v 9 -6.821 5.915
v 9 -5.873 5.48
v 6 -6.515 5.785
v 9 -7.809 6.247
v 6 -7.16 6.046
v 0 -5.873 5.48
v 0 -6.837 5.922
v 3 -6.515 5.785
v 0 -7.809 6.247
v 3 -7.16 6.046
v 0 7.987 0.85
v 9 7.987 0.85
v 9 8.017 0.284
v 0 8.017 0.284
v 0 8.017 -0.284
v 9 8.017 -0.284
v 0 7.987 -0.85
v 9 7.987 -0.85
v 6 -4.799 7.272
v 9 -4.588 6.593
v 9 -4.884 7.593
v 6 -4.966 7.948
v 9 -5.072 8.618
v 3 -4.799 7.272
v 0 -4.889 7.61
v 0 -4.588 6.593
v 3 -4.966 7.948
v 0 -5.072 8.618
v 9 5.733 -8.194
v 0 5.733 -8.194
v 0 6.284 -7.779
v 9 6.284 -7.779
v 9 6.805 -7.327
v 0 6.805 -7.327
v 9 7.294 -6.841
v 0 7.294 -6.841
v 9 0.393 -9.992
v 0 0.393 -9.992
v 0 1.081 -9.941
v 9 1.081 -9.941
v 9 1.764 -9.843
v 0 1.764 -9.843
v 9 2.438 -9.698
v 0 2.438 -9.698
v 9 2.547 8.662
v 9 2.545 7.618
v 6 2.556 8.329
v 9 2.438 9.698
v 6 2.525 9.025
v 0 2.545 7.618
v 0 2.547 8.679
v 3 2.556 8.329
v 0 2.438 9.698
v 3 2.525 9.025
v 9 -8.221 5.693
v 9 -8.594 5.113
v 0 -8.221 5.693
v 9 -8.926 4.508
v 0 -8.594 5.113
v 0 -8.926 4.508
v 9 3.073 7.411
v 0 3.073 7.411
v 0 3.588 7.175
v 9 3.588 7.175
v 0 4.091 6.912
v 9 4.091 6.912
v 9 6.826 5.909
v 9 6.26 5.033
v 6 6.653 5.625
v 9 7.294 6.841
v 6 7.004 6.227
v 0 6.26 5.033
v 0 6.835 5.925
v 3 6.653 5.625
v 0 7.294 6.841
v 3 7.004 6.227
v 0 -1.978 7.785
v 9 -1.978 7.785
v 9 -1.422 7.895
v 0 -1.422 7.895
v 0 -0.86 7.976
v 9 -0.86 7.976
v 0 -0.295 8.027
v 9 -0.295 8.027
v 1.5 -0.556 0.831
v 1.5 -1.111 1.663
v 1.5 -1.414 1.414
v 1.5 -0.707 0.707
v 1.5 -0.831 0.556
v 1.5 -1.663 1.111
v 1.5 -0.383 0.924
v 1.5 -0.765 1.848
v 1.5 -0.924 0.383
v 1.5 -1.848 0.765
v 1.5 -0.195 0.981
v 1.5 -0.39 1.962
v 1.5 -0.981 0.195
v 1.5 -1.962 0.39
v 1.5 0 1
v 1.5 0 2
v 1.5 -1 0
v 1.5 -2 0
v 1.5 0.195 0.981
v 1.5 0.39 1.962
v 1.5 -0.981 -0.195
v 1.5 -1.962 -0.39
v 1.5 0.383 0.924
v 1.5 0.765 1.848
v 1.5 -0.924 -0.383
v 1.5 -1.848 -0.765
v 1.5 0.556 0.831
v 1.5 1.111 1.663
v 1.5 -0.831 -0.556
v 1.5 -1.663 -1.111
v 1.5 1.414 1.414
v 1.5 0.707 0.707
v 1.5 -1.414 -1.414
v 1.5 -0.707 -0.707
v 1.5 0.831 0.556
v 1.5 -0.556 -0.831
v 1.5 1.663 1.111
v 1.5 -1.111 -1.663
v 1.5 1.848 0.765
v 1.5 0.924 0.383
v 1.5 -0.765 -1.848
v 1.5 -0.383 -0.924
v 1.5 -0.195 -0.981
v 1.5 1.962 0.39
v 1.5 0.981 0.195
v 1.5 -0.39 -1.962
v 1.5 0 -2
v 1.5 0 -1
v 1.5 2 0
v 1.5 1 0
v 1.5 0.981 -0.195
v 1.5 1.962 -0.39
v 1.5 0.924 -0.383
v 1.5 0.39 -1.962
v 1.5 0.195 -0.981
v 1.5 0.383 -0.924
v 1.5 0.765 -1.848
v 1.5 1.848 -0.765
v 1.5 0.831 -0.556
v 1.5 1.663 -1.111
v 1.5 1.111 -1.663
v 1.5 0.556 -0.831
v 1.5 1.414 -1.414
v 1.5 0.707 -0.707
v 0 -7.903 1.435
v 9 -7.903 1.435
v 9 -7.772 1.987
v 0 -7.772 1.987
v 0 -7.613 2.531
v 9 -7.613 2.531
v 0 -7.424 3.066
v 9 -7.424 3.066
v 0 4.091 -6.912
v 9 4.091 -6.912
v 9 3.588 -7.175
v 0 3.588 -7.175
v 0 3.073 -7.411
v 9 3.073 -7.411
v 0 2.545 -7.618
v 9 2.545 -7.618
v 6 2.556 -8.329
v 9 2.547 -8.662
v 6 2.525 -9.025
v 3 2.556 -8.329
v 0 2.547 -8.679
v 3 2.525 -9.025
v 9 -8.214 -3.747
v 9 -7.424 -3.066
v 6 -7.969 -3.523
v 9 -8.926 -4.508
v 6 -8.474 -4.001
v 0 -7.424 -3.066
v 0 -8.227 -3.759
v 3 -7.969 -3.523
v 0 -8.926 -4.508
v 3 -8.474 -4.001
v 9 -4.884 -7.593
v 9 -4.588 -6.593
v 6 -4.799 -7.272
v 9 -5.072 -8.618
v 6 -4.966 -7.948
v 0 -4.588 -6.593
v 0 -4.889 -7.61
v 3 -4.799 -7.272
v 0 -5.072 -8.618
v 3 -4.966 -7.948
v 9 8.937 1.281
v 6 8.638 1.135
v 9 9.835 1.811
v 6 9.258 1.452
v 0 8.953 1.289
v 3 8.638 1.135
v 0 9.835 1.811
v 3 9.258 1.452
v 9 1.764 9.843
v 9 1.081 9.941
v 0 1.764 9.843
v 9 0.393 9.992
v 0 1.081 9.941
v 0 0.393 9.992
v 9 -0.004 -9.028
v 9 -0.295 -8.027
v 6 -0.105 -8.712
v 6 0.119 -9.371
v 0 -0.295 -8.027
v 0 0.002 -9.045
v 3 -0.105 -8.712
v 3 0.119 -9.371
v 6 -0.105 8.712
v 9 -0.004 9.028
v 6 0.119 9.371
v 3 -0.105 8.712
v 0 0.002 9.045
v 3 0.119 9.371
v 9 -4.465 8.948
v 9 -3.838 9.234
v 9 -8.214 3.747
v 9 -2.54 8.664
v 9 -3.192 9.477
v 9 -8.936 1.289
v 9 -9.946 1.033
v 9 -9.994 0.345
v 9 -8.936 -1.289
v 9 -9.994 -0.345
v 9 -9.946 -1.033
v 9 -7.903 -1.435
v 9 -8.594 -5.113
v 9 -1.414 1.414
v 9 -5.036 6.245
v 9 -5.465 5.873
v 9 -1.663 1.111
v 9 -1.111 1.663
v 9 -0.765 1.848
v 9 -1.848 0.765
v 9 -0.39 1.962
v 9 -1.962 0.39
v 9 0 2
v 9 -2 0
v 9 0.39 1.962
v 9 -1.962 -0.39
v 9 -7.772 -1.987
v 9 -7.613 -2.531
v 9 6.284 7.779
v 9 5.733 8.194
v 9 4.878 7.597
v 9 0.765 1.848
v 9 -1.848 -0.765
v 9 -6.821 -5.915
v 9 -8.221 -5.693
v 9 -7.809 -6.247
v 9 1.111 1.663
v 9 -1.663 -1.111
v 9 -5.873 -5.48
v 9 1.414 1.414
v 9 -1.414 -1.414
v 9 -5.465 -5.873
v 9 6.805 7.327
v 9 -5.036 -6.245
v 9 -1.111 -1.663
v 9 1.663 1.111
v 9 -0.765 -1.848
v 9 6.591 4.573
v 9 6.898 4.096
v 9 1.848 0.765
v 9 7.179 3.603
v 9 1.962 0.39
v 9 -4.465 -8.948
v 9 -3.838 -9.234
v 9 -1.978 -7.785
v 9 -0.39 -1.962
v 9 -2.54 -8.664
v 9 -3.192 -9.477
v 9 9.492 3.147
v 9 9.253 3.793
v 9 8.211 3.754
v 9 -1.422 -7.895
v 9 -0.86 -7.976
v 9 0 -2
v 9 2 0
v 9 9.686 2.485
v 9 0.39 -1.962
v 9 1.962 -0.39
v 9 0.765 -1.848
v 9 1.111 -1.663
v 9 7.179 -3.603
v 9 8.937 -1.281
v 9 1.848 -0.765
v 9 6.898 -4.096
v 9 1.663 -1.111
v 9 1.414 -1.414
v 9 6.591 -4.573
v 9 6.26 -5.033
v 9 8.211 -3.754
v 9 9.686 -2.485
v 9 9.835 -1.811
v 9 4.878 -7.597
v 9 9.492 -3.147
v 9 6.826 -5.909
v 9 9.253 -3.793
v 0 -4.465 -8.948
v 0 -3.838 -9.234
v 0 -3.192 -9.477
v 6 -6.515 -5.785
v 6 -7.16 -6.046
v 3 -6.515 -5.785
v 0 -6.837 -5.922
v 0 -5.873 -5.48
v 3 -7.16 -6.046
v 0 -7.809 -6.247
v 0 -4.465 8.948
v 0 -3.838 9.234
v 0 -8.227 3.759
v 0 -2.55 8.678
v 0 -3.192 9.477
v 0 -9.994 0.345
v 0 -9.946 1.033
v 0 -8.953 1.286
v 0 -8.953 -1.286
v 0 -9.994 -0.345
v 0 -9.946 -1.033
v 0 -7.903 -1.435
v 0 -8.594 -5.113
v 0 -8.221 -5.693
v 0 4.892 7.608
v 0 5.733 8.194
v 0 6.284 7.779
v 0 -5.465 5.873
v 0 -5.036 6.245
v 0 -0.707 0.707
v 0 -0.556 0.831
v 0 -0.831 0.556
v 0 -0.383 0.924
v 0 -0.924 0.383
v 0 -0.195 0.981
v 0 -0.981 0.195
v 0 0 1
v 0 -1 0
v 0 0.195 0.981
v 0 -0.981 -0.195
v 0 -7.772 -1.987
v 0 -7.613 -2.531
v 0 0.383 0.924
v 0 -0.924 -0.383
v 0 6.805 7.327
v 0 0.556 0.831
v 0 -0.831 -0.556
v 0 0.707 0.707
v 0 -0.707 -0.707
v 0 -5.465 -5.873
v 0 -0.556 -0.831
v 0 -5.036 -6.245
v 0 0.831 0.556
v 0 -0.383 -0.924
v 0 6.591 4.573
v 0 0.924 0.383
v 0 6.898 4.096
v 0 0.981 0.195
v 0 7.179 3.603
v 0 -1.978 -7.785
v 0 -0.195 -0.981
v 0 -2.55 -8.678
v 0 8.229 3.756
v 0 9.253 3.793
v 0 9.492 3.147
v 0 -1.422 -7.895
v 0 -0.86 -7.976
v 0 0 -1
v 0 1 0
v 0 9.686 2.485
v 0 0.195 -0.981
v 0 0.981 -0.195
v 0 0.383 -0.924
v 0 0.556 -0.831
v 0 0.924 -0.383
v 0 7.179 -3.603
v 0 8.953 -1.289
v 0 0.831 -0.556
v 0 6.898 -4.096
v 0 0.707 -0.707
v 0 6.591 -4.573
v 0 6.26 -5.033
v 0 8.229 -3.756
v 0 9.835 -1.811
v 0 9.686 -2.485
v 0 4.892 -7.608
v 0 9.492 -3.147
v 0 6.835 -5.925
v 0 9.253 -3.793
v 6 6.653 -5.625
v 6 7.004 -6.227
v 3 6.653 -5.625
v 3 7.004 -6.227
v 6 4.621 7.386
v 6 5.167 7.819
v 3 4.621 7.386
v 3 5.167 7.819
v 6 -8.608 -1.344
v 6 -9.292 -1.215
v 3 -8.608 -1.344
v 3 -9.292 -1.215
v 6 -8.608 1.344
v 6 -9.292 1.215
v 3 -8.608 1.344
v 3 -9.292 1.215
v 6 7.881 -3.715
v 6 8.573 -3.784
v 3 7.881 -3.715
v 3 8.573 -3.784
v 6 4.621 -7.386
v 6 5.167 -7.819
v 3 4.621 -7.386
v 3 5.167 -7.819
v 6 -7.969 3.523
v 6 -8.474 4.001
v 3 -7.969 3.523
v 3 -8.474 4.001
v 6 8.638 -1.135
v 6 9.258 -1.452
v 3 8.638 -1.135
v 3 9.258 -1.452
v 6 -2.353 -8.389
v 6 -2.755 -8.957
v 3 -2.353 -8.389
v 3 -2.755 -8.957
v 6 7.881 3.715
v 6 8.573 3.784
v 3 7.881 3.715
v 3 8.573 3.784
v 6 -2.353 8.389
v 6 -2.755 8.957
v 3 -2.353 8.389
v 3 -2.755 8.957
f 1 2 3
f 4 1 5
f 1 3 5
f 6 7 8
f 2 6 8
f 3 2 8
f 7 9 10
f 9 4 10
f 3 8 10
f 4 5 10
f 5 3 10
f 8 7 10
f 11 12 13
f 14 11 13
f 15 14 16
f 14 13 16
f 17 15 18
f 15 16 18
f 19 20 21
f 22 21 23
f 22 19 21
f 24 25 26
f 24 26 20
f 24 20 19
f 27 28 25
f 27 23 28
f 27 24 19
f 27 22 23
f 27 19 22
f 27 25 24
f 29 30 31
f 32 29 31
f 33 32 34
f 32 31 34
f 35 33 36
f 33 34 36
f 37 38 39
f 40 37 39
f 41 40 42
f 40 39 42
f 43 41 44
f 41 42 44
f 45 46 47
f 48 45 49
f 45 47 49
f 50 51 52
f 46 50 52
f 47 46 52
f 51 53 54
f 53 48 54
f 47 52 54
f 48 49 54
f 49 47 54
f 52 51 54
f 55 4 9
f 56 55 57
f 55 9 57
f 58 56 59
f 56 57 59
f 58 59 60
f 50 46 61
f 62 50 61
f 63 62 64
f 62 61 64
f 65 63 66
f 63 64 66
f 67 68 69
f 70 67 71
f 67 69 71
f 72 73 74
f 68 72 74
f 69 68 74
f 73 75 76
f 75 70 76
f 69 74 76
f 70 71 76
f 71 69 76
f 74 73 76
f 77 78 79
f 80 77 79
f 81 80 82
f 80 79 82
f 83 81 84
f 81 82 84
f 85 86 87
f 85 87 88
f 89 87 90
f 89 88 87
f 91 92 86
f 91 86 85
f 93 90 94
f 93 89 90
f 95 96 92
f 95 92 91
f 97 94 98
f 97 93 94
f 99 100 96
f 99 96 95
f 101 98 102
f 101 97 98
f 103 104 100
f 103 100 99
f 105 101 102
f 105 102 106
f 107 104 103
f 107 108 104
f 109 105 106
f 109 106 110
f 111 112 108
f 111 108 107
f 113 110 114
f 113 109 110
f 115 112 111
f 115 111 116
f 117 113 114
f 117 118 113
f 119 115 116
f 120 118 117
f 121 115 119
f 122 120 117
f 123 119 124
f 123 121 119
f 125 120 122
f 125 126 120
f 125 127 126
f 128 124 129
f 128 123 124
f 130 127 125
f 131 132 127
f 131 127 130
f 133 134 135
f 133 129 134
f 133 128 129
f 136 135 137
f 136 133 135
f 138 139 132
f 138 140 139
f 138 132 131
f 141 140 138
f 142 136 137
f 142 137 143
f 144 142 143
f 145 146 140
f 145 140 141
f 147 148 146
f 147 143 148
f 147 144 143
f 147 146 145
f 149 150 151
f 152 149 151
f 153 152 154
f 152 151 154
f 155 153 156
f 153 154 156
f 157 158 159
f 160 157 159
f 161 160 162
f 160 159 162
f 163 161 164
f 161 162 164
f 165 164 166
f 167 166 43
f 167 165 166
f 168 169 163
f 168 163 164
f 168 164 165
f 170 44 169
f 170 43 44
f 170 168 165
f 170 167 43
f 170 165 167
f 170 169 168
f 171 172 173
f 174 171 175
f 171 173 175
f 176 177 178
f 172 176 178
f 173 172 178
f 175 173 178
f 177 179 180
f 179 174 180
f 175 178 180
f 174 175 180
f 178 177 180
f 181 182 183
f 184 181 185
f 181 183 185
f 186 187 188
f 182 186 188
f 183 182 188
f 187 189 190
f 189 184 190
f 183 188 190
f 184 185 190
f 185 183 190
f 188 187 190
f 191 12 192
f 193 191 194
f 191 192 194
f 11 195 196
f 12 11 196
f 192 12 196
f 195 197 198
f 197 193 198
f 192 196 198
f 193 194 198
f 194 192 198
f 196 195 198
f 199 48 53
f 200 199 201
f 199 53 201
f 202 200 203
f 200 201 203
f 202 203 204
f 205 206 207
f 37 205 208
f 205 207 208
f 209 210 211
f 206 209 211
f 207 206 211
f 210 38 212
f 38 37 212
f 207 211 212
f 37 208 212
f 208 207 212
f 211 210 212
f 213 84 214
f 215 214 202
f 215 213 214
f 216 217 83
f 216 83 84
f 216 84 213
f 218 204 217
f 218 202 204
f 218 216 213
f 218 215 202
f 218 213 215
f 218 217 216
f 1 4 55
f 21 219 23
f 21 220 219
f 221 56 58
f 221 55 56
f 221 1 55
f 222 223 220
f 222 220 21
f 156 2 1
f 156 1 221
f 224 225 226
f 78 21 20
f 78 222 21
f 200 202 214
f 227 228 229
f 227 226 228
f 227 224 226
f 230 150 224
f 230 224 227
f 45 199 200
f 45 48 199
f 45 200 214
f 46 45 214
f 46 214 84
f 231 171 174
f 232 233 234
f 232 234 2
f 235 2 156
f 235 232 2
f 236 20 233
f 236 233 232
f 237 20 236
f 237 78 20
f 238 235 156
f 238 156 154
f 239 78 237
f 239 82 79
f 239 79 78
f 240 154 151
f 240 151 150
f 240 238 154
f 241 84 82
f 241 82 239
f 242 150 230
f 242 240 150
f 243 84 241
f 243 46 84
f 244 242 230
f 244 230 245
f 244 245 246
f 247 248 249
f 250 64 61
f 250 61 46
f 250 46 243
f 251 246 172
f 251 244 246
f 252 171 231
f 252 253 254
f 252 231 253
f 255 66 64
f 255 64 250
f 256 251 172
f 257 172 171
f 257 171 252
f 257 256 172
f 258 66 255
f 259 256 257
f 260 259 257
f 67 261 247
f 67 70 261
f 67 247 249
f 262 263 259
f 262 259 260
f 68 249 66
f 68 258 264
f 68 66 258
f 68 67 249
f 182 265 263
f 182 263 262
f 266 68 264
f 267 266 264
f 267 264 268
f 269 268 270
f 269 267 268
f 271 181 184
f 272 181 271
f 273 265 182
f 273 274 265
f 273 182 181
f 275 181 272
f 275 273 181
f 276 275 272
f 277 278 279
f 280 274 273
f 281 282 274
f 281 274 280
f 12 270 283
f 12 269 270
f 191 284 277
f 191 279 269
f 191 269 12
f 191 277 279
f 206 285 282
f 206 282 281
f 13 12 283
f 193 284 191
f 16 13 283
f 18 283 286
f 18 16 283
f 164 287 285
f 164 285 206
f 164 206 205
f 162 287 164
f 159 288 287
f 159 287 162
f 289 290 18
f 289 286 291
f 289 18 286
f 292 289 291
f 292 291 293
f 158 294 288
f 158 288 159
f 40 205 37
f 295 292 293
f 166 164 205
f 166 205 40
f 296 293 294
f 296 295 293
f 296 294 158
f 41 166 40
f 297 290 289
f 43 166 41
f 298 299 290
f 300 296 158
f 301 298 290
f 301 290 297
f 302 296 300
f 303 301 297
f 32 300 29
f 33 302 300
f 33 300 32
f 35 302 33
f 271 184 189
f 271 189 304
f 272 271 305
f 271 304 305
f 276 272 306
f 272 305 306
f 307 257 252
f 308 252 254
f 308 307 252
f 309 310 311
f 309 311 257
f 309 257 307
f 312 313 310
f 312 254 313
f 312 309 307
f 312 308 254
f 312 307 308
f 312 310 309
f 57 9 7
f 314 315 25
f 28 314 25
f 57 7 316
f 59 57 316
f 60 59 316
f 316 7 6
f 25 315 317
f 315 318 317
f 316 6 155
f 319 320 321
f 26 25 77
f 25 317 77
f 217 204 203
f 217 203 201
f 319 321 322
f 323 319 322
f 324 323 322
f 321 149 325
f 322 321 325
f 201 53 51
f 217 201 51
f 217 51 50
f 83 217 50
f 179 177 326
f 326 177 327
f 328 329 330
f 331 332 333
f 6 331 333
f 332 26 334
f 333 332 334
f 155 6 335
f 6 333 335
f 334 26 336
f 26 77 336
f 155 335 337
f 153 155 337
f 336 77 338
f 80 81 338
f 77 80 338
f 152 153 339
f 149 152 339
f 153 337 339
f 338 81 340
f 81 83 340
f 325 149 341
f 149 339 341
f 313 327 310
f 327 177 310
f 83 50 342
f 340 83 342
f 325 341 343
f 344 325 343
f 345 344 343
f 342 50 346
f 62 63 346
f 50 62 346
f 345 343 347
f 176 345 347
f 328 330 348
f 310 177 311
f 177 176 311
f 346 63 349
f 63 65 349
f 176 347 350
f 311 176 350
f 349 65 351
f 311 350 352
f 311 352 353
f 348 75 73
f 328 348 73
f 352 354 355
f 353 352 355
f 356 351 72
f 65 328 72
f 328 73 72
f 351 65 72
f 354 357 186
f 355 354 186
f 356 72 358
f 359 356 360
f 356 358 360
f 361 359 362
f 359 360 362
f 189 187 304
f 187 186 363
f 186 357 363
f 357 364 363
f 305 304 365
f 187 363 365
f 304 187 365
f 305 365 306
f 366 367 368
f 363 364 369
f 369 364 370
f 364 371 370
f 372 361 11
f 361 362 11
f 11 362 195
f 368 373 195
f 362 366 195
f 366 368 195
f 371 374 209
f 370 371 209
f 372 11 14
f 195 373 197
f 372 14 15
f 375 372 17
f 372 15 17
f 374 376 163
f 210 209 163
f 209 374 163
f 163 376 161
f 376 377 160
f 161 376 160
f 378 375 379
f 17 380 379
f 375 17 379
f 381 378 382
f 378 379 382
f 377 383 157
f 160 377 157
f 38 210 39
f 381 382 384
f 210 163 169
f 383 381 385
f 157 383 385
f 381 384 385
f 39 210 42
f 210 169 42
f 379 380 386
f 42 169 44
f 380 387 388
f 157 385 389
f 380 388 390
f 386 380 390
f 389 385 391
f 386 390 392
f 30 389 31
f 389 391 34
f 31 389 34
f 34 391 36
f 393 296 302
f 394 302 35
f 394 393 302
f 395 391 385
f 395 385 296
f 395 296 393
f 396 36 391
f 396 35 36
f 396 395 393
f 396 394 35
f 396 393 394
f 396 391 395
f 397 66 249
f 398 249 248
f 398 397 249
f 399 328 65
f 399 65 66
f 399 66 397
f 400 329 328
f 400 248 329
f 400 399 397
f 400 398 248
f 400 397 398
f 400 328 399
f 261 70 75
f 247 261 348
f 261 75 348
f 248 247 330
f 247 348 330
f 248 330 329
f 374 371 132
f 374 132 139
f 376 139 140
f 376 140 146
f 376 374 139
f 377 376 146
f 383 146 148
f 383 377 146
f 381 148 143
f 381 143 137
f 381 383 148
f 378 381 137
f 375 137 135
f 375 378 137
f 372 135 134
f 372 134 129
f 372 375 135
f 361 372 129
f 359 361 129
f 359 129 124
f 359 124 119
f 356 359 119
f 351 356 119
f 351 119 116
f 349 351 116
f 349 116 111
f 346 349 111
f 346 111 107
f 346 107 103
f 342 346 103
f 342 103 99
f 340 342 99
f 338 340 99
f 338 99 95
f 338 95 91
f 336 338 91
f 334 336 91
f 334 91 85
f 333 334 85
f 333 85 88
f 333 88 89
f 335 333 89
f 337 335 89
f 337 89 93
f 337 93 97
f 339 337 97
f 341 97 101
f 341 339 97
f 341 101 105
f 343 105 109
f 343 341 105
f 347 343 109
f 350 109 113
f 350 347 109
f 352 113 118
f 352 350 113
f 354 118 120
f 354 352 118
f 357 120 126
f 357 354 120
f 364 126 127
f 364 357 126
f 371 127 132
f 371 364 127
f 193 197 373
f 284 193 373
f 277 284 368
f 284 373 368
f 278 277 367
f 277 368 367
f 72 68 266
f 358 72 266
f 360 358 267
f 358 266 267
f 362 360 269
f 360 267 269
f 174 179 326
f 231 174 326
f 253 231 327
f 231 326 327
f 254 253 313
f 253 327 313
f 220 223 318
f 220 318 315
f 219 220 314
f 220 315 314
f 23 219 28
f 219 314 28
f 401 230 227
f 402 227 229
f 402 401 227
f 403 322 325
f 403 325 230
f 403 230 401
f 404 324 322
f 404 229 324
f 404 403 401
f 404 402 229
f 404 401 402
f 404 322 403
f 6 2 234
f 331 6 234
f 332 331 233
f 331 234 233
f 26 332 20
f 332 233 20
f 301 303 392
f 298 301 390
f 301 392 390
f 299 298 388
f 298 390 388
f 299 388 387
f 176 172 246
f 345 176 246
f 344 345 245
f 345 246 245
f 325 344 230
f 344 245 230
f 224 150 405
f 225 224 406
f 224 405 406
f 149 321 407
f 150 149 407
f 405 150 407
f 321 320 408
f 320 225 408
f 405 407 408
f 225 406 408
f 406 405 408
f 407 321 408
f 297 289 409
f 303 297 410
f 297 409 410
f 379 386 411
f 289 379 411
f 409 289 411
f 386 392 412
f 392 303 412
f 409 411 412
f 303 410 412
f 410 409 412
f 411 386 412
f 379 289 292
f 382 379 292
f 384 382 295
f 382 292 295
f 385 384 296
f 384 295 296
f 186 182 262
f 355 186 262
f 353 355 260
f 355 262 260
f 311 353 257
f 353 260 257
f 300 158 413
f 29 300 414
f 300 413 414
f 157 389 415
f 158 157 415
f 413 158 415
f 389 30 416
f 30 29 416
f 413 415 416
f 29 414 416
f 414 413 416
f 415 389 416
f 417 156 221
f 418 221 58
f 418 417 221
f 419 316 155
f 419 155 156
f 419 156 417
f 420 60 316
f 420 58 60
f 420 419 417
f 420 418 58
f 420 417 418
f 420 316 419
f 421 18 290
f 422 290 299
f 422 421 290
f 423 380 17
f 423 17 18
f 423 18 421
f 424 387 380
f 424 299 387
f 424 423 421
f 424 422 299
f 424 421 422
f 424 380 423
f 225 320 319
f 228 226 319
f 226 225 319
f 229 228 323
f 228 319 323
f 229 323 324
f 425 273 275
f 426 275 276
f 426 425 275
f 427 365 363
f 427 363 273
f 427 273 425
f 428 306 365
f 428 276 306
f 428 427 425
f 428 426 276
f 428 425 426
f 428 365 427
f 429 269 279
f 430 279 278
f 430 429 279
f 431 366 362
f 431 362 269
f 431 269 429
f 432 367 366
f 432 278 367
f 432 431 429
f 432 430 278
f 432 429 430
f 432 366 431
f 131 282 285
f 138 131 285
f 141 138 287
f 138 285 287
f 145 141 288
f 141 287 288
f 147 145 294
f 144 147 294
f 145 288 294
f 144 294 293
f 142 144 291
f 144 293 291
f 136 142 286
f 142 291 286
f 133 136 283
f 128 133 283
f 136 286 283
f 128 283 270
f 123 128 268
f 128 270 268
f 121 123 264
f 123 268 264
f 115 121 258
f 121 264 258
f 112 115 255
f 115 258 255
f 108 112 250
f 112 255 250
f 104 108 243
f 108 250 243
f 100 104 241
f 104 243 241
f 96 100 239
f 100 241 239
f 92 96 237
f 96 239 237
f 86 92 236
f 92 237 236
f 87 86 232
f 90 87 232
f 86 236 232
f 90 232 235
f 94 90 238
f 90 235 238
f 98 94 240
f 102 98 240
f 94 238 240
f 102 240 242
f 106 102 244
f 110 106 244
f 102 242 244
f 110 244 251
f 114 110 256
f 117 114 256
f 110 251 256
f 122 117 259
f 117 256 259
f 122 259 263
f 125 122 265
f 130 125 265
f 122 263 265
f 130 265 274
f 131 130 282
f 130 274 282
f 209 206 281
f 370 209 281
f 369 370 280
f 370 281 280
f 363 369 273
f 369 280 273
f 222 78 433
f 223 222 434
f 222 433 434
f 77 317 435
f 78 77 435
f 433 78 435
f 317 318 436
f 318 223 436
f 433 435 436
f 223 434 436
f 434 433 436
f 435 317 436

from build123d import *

# Parameters (mm, degrees)
SKETCH2_R           = 10
SKETCH2_R_2         = 1
BOSS_EXTRUDE2_DEPTH = 9
CUT_EXTRUDE4_DEPTH  = 10
CIRPATTERN2_COUNT   = 11
SKETCH7_R           = 2
SKETCH7_R_2         = 1
CUT_EXTRUDE5_DEPTH  = 7.5


with BuildPart() as part:
    # Sketch2 → Boss-Extrude2 (new body)
    with BuildSketch(Plane(origin=(0, 0, 0), x_dir=(0, 0, -1), z_dir=(1, 0, 0))):
        Circle(SKETCH2_R)
        Circle(SKETCH2_R_2, mode=Mode.SUBTRACT)
    extrude(amount=BOSS_EXTRUDE2_DEPTH)

    # Sketch6 → Cut-Extrude4 (cut, symmetric)
    with BuildSketch(Plane(origin=(0, 0, 0), x_dir=(0, 0, -1), z_dir=(1, 0, 0))):
        with BuildLine():
            ThreePointArc((1.85, 9.889708377), (0, 10.025881913), (-1.85, 9.889708377))
            add(Edge.make_bspline(
                [(-0.85, 7.986983034), (-1.133345999, 8.672201219), (-1.446471777, 9.32650192), (-1.85, 9.889708377)],
                knots=[0.309355195, 0.309355195, 0.309355195, 0.309355195, 0.515063523, 0.515063523, 0.515063523, 0.515063523], degree=3))
            ThreePointArc((-0.85, 7.986983034), (0, 8.021021821), (0.85, 7.986983034))
            add(Edge.make_bspline(
                [(0.85, 7.986983034), (1.133345999, 8.672201219), (1.446471777, 9.32650192), (1.85, 9.889708377)],
                knots=[0.309355195, 0.309355195, 0.309355195, 0.309355195, 0.515063523, 0.515063523, 0.515063523, 0.515063523], degree=3))
        make_face()
    cut_extrude4 = extrude(amount=CUT_EXTRUDE4_DEPTH, both=True, mode=Mode.SUBTRACT)

    # CirPattern2: Cut-Extrude4 ×11 about axis
    cirpattern2_axis = Axis((9, 0, 0), (-1, 0, 0))
    for i in range(1, CIRPATTERN2_COUNT):
        add(cut_extrude4.rotate(cirpattern2_axis, i * 360 / CIRPATTERN2_COUNT), mode=Mode.SUBTRACT)

    # Sketch7 → Cut-Extrude5 (cut)
    with BuildSketch(Plane(origin=(9, 0, 0), x_dir=(0, 0, -1), z_dir=(1, 0, 0))):
        Circle(SKETCH7_R)
        Circle(SKETCH7_R_2, mode=Mode.SUBTRACT)
    extrude(amount=-CUT_EXTRUDE5_DEPTH, mode=Mode.SUBTRACT)


solid = part.part
